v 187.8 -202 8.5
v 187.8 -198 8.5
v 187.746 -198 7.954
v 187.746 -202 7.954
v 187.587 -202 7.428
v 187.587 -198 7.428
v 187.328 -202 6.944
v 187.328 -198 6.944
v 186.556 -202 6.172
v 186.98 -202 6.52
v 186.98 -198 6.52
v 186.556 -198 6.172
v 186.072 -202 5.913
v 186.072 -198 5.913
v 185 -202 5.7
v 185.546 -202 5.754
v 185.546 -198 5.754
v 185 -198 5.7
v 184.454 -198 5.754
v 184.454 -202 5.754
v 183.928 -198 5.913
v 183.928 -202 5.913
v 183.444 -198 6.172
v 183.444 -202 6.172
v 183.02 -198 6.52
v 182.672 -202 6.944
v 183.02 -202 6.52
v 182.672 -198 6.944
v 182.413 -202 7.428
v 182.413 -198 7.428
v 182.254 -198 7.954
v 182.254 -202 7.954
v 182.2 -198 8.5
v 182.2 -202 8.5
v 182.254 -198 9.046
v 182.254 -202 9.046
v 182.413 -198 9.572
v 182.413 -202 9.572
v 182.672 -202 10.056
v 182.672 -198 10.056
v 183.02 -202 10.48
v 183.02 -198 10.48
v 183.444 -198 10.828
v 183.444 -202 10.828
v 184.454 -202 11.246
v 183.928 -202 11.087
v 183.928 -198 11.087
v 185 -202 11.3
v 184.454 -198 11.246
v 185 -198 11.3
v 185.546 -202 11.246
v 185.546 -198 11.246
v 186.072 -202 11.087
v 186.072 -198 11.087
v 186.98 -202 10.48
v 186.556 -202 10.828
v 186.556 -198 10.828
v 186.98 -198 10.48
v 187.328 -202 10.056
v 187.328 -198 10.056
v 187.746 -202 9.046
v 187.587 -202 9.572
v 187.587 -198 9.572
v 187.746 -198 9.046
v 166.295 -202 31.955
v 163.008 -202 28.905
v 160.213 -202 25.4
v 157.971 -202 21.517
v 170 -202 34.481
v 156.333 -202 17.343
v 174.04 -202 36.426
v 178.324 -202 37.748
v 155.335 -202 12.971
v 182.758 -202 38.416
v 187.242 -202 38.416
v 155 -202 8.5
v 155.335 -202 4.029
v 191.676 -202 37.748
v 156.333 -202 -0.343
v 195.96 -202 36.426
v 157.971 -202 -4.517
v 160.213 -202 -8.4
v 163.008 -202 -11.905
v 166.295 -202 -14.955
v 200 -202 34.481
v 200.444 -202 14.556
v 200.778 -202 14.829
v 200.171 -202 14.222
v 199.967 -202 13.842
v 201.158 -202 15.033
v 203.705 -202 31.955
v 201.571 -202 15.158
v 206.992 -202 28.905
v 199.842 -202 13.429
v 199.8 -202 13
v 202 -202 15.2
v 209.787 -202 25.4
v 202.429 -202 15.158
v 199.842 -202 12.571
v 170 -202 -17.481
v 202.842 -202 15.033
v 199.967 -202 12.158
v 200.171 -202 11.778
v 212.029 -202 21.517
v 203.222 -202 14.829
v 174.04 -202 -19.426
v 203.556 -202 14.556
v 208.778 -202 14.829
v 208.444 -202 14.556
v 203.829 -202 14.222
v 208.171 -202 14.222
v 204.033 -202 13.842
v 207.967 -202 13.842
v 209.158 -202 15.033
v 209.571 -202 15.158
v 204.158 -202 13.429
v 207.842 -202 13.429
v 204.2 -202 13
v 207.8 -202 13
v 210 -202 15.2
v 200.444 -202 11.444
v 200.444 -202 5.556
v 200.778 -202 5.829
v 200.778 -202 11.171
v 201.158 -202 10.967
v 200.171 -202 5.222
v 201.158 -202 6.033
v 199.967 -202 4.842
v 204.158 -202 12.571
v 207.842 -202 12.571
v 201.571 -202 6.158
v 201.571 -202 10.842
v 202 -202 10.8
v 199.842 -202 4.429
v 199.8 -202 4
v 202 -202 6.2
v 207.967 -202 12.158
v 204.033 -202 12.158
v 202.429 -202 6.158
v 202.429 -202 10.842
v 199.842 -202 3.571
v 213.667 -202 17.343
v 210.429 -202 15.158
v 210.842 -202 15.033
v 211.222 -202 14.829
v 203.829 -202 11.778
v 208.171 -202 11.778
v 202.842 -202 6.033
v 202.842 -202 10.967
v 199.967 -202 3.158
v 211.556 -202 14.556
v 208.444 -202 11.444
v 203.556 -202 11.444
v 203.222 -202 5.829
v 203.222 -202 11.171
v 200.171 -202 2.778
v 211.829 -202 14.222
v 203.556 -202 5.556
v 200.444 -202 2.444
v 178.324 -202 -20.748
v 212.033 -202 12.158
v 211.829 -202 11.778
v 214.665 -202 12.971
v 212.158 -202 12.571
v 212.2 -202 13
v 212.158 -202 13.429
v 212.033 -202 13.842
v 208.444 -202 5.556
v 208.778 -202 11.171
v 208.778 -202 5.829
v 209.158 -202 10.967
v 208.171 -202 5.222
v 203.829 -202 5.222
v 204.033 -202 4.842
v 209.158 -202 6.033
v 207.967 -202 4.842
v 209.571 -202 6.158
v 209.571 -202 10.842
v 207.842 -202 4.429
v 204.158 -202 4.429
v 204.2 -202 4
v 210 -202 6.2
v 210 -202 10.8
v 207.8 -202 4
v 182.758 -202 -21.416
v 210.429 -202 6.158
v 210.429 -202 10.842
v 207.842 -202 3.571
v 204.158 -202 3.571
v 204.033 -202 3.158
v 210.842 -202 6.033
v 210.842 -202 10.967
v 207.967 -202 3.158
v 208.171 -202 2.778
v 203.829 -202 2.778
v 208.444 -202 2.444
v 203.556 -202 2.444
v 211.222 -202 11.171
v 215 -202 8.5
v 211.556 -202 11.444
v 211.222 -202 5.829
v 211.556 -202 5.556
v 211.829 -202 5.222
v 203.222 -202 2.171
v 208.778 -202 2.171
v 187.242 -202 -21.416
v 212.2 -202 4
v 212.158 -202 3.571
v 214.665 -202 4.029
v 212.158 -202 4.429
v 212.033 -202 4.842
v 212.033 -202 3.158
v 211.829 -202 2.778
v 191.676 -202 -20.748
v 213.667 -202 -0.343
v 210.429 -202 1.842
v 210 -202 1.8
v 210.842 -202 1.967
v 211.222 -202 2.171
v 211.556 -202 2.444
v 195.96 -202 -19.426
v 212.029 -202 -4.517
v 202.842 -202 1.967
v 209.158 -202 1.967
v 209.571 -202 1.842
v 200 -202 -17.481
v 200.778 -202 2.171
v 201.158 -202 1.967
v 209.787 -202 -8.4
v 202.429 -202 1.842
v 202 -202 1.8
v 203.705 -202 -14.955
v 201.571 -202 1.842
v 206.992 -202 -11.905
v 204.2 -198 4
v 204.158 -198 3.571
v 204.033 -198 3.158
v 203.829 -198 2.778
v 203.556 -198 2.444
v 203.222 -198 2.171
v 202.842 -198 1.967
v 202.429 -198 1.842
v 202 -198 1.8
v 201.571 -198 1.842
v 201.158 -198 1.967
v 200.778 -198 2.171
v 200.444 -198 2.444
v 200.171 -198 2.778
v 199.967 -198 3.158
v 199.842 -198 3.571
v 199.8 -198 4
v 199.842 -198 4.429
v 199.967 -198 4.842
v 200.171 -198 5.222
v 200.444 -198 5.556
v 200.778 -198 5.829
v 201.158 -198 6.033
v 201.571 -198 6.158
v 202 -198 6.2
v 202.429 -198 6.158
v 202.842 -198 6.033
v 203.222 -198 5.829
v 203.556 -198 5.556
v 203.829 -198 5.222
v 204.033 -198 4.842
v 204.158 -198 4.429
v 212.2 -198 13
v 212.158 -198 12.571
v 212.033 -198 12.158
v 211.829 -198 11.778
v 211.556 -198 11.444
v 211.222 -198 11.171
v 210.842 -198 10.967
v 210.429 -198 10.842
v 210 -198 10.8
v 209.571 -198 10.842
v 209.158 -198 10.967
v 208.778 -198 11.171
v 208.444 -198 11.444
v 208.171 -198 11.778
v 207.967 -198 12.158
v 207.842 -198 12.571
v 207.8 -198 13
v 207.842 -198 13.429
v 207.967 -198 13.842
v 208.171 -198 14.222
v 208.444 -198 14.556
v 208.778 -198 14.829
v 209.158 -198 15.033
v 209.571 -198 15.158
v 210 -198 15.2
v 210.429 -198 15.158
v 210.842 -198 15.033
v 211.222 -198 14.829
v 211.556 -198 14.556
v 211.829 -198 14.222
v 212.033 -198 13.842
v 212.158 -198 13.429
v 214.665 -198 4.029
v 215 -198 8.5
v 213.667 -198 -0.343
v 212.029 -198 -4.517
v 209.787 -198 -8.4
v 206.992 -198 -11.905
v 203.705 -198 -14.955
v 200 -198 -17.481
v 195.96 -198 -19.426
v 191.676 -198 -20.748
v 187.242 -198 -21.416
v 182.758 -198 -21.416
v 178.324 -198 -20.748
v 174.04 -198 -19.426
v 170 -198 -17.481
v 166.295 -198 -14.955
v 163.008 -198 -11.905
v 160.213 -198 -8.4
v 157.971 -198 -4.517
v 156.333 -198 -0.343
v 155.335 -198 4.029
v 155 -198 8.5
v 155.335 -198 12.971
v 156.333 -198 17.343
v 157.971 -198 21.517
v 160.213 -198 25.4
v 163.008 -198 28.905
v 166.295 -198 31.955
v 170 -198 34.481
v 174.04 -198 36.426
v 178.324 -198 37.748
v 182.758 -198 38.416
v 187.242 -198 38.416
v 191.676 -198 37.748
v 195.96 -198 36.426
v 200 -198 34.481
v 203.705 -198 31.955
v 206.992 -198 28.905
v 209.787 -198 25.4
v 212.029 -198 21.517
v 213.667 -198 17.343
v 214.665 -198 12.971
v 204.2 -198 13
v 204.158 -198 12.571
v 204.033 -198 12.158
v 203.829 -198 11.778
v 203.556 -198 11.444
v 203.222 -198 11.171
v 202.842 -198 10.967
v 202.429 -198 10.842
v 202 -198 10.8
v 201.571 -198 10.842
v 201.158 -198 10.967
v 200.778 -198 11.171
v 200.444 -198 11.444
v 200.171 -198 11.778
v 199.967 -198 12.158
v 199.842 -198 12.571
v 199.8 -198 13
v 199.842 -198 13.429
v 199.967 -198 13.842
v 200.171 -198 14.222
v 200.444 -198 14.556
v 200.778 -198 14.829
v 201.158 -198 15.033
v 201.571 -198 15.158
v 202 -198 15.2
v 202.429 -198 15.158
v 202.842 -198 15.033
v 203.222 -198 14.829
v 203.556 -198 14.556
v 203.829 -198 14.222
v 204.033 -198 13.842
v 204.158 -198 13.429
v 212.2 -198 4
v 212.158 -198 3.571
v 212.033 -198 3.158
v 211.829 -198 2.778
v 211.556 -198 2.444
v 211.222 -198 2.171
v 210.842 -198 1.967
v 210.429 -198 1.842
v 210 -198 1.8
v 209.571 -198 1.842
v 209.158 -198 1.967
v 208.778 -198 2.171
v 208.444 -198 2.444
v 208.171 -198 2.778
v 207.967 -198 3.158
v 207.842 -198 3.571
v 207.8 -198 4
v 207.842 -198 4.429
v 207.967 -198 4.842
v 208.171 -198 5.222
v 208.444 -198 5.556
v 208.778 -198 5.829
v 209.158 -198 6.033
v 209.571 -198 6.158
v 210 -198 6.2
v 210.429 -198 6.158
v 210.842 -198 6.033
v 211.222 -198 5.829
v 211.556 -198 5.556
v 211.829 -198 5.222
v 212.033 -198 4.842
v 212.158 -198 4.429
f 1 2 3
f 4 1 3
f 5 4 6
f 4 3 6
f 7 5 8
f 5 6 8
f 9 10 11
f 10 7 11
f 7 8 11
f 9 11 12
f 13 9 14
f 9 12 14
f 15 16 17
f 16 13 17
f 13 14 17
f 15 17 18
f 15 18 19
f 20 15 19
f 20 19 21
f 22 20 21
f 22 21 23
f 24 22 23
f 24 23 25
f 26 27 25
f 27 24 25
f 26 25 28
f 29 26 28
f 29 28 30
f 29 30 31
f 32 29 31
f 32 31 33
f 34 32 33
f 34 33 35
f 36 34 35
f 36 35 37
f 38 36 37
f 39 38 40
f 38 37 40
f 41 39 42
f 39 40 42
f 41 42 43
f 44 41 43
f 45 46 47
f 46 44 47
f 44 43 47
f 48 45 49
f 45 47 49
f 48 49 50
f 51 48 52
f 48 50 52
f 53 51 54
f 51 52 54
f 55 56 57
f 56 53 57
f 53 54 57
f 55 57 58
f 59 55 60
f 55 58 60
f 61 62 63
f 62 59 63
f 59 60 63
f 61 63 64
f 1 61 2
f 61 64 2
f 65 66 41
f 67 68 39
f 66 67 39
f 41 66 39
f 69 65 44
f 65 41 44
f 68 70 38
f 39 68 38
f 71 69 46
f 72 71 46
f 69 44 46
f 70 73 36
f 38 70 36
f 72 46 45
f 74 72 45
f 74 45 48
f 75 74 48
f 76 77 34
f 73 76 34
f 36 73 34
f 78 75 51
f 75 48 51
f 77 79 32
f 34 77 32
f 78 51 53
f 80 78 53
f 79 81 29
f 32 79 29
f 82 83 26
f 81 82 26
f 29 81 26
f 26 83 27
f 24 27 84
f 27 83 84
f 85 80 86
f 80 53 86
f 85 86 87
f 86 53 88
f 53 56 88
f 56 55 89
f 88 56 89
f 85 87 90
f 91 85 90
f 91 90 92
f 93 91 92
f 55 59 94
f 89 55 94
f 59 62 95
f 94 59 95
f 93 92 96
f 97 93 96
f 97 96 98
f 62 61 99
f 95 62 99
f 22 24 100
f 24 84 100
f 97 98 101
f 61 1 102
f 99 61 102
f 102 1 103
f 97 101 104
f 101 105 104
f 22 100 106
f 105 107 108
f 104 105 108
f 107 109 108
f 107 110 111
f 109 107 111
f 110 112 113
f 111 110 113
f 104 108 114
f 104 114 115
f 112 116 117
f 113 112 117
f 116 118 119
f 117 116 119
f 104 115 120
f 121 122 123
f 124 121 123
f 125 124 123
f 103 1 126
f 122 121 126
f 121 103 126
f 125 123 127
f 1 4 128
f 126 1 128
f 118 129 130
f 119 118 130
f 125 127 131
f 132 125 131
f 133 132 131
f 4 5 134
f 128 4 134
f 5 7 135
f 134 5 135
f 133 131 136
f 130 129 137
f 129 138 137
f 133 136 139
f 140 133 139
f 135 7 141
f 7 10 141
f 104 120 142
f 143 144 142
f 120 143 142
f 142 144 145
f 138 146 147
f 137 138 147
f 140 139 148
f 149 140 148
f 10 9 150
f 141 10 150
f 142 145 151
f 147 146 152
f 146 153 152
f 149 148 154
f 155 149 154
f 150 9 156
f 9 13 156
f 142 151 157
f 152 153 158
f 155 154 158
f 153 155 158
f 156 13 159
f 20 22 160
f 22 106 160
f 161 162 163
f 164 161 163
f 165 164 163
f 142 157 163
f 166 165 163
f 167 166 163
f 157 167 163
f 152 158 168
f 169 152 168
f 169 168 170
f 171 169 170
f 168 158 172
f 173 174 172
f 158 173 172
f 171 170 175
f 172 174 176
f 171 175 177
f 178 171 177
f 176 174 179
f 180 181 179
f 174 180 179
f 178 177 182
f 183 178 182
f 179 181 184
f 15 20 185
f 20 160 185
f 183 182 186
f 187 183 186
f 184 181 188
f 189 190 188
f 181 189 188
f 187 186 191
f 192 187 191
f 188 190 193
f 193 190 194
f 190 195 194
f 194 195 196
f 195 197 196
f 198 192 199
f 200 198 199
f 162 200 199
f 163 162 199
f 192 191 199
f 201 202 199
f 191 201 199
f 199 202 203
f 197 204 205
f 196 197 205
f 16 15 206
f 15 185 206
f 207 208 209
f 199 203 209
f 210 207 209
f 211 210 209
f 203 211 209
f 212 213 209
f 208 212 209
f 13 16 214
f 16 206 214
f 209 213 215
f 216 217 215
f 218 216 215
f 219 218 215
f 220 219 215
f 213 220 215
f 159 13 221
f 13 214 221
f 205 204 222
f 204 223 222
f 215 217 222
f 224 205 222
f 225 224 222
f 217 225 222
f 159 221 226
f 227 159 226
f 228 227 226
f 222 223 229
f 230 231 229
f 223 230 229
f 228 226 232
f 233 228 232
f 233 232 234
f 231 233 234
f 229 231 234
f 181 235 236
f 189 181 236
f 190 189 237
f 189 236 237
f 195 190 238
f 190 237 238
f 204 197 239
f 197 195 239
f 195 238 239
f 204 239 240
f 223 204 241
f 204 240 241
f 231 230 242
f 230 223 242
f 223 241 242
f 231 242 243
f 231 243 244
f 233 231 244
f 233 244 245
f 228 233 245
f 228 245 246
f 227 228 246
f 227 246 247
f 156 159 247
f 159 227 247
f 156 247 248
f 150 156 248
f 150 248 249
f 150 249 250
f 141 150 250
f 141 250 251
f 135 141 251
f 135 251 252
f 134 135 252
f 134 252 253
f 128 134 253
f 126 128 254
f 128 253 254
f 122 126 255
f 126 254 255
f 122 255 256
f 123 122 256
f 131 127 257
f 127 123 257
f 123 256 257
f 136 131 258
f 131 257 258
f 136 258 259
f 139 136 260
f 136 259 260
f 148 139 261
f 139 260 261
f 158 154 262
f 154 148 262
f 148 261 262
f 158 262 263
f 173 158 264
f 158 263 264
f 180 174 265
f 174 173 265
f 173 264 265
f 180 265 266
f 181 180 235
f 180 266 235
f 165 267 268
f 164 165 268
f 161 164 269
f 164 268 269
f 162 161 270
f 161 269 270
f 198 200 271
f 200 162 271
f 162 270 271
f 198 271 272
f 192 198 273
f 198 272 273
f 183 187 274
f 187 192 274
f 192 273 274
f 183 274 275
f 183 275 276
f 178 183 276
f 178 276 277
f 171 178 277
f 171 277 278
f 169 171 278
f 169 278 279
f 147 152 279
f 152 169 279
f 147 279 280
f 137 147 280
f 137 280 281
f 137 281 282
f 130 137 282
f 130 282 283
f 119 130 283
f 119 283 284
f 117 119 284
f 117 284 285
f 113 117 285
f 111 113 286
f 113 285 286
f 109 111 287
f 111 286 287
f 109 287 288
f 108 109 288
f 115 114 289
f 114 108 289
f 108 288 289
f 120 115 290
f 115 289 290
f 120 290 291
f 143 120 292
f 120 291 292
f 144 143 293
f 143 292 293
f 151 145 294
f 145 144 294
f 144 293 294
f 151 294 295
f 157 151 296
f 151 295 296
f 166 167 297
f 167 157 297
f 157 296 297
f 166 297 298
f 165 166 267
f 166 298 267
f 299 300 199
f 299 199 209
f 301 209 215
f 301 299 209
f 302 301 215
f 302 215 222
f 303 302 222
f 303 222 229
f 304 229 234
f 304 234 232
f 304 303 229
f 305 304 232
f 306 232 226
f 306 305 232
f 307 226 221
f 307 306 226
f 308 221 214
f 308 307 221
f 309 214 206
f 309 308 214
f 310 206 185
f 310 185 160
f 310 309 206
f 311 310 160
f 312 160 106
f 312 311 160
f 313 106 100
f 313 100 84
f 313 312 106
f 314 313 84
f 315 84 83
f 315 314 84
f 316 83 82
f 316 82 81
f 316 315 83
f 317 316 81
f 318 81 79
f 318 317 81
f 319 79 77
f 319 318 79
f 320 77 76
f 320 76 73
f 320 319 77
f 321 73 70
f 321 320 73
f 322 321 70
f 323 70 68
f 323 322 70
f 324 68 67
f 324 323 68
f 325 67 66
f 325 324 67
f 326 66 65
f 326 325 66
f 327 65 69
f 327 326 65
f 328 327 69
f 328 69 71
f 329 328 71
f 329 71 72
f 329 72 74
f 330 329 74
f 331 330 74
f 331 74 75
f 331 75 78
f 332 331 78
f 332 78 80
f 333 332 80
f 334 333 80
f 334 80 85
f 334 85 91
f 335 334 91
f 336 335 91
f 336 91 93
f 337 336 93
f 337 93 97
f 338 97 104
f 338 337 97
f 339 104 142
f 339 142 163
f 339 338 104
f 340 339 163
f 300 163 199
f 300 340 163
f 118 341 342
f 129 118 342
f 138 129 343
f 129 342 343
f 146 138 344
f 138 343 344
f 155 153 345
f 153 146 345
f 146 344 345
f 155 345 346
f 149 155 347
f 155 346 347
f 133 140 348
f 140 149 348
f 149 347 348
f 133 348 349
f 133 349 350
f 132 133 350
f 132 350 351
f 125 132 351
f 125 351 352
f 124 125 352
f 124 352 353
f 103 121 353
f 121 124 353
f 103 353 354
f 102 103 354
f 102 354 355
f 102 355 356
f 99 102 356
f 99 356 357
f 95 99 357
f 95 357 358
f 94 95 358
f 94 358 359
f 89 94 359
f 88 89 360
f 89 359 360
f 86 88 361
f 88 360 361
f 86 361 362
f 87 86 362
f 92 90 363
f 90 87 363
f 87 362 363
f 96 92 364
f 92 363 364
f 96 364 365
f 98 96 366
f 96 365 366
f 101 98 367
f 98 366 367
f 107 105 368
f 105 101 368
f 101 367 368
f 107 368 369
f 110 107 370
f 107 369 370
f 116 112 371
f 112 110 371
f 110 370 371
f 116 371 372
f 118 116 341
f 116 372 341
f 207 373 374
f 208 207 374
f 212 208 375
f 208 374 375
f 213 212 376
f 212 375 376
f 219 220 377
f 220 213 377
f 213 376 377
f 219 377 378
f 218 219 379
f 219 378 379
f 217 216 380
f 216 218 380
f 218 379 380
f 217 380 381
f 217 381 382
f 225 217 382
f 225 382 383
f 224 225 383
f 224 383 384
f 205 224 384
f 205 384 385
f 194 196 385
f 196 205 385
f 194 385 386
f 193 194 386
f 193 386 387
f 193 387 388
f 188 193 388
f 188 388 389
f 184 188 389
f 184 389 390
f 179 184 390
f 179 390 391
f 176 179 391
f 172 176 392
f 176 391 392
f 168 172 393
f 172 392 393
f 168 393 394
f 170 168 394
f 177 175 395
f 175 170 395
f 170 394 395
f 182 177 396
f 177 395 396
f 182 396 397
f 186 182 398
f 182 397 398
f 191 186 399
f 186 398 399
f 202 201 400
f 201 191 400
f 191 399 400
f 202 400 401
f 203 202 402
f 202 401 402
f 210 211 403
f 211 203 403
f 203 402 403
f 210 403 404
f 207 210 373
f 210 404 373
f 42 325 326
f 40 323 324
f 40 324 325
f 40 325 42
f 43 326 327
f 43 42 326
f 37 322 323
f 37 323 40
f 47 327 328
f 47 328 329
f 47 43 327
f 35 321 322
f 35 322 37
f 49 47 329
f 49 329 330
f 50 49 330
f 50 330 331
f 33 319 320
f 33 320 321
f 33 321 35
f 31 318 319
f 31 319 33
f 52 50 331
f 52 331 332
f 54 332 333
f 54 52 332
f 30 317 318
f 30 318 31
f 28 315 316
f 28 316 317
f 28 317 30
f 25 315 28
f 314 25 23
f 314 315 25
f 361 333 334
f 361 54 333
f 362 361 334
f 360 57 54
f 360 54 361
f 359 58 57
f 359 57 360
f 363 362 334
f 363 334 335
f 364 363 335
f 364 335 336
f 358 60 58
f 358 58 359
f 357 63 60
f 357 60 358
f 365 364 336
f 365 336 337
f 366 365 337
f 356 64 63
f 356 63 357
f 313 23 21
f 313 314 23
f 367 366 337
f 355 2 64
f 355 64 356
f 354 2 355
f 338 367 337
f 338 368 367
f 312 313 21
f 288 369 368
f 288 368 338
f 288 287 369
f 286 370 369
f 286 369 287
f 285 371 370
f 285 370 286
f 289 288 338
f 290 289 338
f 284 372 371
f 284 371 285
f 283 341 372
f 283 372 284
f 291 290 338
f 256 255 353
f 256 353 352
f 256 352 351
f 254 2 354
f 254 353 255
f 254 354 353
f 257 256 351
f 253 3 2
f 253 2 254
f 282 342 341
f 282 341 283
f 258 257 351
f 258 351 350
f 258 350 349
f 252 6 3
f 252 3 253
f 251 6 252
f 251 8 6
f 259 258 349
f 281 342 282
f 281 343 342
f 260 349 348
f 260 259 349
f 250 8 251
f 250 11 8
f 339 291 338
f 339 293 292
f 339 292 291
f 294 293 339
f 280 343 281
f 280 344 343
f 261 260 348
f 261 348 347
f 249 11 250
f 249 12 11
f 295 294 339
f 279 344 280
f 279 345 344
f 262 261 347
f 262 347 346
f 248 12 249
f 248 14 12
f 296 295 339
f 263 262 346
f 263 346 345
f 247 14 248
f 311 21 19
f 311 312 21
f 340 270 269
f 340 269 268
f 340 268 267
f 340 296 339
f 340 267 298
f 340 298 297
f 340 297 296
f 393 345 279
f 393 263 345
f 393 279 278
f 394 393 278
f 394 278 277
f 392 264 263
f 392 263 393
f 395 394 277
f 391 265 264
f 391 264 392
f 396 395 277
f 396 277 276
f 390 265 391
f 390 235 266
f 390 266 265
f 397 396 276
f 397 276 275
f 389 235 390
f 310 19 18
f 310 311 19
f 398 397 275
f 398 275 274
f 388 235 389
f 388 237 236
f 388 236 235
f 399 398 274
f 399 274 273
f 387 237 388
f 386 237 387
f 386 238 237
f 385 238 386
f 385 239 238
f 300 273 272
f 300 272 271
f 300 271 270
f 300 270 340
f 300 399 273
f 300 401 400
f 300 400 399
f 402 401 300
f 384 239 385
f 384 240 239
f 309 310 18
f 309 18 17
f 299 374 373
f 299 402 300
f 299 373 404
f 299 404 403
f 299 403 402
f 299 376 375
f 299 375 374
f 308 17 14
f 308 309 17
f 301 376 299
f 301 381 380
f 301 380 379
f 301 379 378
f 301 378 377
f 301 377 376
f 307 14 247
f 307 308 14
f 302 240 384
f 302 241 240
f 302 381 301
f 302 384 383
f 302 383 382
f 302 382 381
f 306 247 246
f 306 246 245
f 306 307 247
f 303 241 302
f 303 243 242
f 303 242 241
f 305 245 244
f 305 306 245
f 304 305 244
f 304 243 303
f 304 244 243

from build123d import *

# Parameters (mm, degrees)
CYLINDER052_R          = 2.8
CYLINDER052_DEPTH      = 10
CYLINDER052_ROLL_ANGLE = -90
CYLINDER047_R          = 2.2
CYLINDER047_DEPTH      = 26
CYLINDER047_ROLL_ANGLE = -90
ARRAY018_X_COUNT       = 2
ARRAY018_X_PITCH       = 8
ARRAY018_Z_COUNT       = 2
ARRAY018_Z_PITCH       = 9
CYLINDER045_R          = 30
CYLINDER045_DEPTH      = 4
CYLINDER045_ROLL_ANGLE = -90


with BuildPart() as centro_traccion001:
    # Cylinder052 → Cylinder052 (new body)
    with BuildSketch(Plane.XY):
        Circle(CYLINDER052_R)
    extrude(amount=CYLINDER052_DEPTH)


with BuildPart() as centro_traccion001_1:
    # Cylinder052 roll: moved
    add(centro_traccion001.part.rotate(Axis((0, 0, 0), (1, 0, 0)), CYLINDER052_ROLL_ANGLE))


with BuildPart() as centro_traccion001_2:
    # Cylinder052 placement: moved
    add(centro_traccion001_1.part.moved(Location((185, 18, 8.5))))


with BuildPart() as taladros_suje_traccion006:
    # Cylinder047 → Cylinder047 (new body)
    with BuildSketch(Plane.XY):
        Circle(CYLINDER047_R)
    extrude(amount=CYLINDER047_DEPTH)


with BuildPart() as taladros_suje_traccion006_1:
    # Cylinder047 roll: moved
    add(taladros_suje_traccion006.part.rotate(Axis((0, 0, 0), (1, 0, 0)), CYLINDER047_ROLL_ANGLE))


with BuildPart() as taladros_suje_traccion006_2:
    # Cylinder047 placement: moved
    add(taladros_suje_traccion006_1.part.moved(Location((202, 0, 4))))

    # Array018 X: Taladros_suje_traccion006 ×2


with BuildPart() as taladros_suje_traccion006_3:
    add(taladros_suje_traccion006_2.part)
    with Locations(*[(i * ARRAY018_X_PITCH, 0, 0) for i in range(1, ARRAY018_X_COUNT)]):
        add(taladros_suje_traccion006_2.part)

    # Array018 Z: Taladros_suje_traccion006 ×2


with BuildPart() as taladros_suje_traccion006_4:
    add(taladros_suje_traccion006_3.part)
    with Locations(*[(0, 0, i * ARRAY018_Z_PITCH) for i in range(1, ARRAY018_Z_COUNT)]):
        add(taladros_suje_traccion006_3.part)


with BuildPart() as traccion_full001:
    # Cylinder045 → Cylinder045 (new body)
    with BuildSketch(Plane.XY):
        Circle(CYLINDER045_R)
    extrude(amount=CYLINDER045_DEPTH)


with BuildPart() as traccion_full001_1:
    # Cylinder045 roll: moved
    add(traccion_full001.part.rotate(Axis((0, 0, 0), (1, 0, 0)), CYLINDER045_ROLL_ANGLE))


with BuildPart() as traccion_full001_2:
    # Cylinder045 placement: moved
    add(traccion_full001_1.part.moved(Location((185, 20, 8.5))))

    # Cut053: cut Taladros_suje_traccion006
    add(taladros_suje_traccion006_4.part, mode=Mode.SUBTRACT)

    # Cut056: cut Centro_traccion001
    add(centro_traccion001_2.part, mode=Mode.SUBTRACT)


with BuildPart() as traccion_full1:
    # Part__Mirroring020: instance of Traccion_full001
    add(traccion_full001_2.part.mirror(Plane(origin=(0, 0, 0), x_dir=(1, 0, 0), z_dir=(0, 1, 0))))


with BuildPart() as traccion_full1_1:
    # Part__Mirroring020 placement: moved
    add(traccion_full1.part.moved(Location((0, -178, 0))))


solid = traccion_full1_1.part
